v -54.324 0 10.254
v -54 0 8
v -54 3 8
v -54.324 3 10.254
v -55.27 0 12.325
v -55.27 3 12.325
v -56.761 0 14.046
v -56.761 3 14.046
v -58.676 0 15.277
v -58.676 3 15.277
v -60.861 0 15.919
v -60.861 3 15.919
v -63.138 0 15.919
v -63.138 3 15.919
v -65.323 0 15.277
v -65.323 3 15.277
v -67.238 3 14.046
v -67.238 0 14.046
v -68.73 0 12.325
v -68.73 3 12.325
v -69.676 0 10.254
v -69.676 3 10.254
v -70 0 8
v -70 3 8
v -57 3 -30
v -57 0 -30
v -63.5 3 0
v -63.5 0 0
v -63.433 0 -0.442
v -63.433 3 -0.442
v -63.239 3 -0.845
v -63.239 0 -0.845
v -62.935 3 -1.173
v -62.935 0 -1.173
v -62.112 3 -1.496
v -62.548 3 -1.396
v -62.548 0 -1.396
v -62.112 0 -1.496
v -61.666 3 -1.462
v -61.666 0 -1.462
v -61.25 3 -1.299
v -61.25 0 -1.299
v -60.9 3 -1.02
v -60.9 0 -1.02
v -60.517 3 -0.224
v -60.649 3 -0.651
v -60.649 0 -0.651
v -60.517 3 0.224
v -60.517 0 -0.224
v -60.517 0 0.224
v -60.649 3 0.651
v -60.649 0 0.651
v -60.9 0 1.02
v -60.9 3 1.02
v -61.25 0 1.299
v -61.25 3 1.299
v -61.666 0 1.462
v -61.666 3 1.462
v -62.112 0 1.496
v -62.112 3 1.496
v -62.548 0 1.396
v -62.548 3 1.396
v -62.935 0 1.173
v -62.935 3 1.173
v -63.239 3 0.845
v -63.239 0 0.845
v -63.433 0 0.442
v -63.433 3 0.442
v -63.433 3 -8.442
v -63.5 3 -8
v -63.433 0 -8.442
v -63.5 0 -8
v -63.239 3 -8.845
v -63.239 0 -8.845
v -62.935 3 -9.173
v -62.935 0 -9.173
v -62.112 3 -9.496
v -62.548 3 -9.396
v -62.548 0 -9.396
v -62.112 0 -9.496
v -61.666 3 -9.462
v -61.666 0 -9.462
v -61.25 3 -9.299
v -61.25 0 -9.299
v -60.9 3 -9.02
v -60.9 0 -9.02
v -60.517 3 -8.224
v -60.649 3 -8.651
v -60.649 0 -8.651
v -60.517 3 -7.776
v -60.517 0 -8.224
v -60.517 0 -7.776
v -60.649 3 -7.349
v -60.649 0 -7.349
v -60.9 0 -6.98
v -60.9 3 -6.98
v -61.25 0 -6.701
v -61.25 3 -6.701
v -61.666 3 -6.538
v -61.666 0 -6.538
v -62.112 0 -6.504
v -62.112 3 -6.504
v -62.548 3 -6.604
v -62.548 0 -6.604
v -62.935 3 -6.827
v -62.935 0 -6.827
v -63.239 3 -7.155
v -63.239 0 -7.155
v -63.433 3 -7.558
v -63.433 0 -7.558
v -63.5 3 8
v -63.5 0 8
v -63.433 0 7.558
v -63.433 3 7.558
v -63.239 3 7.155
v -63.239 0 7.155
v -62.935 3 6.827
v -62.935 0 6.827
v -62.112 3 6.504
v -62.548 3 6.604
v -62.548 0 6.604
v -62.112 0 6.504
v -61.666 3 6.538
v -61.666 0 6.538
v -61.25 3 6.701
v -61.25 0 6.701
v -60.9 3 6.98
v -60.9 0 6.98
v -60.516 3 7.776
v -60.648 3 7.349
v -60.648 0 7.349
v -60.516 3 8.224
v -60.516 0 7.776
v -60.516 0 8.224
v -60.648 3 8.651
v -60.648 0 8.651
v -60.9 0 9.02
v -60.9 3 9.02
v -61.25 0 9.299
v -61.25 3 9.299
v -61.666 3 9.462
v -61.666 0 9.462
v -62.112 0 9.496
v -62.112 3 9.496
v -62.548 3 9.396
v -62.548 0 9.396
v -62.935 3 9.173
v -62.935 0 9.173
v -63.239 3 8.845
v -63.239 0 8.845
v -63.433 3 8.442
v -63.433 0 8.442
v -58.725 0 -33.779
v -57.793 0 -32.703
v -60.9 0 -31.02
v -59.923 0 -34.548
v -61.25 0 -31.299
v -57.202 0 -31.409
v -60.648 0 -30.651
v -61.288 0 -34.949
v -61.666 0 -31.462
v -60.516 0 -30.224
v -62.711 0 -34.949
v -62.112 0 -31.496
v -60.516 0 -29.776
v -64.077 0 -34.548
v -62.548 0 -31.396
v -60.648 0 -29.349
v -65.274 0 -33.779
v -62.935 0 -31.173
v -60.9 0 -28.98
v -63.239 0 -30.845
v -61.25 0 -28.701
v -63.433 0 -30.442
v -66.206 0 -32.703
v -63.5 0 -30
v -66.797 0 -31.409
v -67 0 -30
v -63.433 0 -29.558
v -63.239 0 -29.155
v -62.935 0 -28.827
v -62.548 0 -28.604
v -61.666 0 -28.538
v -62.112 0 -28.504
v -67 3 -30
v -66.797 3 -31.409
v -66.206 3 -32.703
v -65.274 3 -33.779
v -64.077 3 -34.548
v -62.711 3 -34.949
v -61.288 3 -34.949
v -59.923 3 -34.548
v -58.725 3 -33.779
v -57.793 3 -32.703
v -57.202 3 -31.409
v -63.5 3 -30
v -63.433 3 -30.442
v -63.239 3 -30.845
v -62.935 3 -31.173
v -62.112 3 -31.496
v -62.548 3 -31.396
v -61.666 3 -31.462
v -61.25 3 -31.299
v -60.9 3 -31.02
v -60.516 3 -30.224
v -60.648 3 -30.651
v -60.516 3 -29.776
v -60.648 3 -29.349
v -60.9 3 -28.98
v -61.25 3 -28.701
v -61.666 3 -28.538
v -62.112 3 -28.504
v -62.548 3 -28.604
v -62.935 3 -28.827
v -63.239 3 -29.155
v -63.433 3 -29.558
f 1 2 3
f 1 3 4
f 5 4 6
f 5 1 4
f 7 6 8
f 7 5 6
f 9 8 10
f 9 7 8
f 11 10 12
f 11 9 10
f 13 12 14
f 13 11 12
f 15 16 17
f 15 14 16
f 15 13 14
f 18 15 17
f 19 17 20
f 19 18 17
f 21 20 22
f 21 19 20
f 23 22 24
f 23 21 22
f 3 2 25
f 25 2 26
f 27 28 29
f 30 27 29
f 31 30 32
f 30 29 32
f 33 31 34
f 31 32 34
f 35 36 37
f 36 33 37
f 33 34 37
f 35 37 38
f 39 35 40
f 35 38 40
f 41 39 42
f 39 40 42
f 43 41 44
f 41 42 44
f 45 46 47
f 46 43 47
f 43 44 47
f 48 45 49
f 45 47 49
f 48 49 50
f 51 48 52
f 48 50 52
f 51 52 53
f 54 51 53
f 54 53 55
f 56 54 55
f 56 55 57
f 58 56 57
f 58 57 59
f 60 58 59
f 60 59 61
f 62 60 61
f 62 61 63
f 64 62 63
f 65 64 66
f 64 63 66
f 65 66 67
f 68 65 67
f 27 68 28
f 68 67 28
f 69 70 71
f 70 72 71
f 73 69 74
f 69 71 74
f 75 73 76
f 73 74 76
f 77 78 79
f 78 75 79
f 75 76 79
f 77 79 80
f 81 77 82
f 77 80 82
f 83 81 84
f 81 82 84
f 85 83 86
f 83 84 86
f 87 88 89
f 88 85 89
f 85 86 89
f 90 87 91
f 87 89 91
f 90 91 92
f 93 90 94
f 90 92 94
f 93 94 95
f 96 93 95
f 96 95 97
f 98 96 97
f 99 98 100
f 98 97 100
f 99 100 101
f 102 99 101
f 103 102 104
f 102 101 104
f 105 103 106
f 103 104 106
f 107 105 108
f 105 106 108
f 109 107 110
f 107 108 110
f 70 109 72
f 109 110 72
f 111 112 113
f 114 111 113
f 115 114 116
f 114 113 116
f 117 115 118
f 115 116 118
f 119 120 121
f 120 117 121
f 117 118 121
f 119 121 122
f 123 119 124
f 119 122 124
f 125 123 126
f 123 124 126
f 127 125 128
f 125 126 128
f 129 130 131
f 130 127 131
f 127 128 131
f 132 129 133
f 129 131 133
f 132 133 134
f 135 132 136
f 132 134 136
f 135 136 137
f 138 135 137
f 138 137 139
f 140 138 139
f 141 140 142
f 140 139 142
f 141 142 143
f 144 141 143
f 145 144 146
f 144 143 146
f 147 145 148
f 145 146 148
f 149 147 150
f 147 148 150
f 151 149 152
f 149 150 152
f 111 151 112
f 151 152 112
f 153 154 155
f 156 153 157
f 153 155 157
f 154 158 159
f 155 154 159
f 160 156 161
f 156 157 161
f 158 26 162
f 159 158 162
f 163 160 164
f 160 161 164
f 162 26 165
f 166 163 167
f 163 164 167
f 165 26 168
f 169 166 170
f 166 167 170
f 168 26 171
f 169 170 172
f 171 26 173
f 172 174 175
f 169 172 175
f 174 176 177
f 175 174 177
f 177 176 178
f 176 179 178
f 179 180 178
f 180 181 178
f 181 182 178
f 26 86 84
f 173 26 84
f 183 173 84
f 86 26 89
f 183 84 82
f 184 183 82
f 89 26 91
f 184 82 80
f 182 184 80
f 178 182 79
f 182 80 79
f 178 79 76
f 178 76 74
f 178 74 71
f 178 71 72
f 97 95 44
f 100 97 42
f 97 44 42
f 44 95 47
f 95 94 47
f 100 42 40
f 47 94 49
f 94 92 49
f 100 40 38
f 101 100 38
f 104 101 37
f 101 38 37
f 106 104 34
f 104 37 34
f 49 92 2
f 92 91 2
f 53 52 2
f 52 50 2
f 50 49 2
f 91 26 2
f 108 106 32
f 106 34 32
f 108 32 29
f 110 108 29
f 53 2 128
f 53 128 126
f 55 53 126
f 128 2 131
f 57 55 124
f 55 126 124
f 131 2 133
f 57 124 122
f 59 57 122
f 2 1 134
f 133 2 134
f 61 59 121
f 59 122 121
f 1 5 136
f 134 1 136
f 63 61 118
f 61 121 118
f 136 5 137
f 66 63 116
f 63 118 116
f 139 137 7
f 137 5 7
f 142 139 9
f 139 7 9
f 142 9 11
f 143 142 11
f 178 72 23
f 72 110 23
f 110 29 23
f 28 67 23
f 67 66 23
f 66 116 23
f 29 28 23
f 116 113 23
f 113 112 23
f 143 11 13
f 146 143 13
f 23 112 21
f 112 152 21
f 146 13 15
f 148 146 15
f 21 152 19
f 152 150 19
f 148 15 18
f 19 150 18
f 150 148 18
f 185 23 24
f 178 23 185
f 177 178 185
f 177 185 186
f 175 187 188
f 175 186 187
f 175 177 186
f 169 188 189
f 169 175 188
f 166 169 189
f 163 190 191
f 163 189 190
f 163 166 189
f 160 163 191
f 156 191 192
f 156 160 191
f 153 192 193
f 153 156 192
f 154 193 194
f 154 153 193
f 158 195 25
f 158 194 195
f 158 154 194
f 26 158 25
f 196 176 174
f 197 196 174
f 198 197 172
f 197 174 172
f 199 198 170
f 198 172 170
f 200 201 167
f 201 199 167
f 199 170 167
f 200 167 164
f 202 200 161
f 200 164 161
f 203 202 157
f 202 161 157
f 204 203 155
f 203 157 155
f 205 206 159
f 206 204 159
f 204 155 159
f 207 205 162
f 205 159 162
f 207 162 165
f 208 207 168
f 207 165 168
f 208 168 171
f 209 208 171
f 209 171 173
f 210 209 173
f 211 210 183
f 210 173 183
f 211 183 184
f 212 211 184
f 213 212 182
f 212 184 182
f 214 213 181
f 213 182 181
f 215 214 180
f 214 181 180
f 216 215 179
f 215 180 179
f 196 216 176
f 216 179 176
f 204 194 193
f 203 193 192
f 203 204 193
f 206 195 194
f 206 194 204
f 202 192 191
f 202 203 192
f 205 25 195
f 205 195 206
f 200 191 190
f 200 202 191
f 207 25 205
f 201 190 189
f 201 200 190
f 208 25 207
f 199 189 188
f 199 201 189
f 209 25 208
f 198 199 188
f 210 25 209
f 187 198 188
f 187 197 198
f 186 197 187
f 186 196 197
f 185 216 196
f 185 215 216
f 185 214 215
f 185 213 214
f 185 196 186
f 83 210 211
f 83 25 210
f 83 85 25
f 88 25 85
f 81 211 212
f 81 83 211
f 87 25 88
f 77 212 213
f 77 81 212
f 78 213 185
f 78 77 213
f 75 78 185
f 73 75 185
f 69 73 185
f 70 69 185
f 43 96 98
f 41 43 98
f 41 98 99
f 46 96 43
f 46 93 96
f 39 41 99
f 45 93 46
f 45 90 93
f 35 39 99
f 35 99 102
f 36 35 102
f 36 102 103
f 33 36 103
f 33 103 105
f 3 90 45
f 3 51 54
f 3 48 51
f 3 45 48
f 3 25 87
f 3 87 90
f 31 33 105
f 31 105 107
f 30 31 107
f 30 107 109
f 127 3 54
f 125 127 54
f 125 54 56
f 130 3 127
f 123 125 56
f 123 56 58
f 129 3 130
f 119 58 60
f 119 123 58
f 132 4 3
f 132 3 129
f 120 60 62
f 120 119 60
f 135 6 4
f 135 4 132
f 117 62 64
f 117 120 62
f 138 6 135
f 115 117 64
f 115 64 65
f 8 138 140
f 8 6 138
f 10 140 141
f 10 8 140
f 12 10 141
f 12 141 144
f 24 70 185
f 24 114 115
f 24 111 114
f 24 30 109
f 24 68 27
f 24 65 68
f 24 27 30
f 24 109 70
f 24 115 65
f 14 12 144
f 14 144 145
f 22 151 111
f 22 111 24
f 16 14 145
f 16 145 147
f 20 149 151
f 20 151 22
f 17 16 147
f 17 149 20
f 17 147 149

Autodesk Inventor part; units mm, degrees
ref_plane "YZ Plane" through (0, 0, 0) normal (1, 0, 0) x (0, 1, 0)
ref_plane "XZ Plane" through (0, 0, 0) normal (0, 1, 0) x (-1, 0, 0)
ref_plane "XY Plane" through (0, 0, 0) normal (0, 0, 1) x (1, 0, 0)
sketch "Boceto1" plane through (0, 0, 0) normal (0, 1, 0) x (-1, 0, 0)
  arc A0 (56.9996, -30) -> (66.9996, -30) centre (61.9996, -30) ccw
  circle A1 centre (62, 0) radius 1.5
  circle A2 centre (61.9996, 8) radius 1.5
  circle A3 centre (62, -8) radius 1.5
  line L0 (69.9996, 8) -> (66.9996, -30)
  line L1 (53.9996, 8) -> (56.9996, -30)
  arc A4 (69.9996, 8) -> (53.9996, 8) centre (61.9996, 8) ccw
  circle A5 centre (61.9996, -30) radius 1.5
  dimension "d126" = 3
extrude "Extrusión1" add sketch "Boceto1" along normal blind 3
properties part number "manivela"
